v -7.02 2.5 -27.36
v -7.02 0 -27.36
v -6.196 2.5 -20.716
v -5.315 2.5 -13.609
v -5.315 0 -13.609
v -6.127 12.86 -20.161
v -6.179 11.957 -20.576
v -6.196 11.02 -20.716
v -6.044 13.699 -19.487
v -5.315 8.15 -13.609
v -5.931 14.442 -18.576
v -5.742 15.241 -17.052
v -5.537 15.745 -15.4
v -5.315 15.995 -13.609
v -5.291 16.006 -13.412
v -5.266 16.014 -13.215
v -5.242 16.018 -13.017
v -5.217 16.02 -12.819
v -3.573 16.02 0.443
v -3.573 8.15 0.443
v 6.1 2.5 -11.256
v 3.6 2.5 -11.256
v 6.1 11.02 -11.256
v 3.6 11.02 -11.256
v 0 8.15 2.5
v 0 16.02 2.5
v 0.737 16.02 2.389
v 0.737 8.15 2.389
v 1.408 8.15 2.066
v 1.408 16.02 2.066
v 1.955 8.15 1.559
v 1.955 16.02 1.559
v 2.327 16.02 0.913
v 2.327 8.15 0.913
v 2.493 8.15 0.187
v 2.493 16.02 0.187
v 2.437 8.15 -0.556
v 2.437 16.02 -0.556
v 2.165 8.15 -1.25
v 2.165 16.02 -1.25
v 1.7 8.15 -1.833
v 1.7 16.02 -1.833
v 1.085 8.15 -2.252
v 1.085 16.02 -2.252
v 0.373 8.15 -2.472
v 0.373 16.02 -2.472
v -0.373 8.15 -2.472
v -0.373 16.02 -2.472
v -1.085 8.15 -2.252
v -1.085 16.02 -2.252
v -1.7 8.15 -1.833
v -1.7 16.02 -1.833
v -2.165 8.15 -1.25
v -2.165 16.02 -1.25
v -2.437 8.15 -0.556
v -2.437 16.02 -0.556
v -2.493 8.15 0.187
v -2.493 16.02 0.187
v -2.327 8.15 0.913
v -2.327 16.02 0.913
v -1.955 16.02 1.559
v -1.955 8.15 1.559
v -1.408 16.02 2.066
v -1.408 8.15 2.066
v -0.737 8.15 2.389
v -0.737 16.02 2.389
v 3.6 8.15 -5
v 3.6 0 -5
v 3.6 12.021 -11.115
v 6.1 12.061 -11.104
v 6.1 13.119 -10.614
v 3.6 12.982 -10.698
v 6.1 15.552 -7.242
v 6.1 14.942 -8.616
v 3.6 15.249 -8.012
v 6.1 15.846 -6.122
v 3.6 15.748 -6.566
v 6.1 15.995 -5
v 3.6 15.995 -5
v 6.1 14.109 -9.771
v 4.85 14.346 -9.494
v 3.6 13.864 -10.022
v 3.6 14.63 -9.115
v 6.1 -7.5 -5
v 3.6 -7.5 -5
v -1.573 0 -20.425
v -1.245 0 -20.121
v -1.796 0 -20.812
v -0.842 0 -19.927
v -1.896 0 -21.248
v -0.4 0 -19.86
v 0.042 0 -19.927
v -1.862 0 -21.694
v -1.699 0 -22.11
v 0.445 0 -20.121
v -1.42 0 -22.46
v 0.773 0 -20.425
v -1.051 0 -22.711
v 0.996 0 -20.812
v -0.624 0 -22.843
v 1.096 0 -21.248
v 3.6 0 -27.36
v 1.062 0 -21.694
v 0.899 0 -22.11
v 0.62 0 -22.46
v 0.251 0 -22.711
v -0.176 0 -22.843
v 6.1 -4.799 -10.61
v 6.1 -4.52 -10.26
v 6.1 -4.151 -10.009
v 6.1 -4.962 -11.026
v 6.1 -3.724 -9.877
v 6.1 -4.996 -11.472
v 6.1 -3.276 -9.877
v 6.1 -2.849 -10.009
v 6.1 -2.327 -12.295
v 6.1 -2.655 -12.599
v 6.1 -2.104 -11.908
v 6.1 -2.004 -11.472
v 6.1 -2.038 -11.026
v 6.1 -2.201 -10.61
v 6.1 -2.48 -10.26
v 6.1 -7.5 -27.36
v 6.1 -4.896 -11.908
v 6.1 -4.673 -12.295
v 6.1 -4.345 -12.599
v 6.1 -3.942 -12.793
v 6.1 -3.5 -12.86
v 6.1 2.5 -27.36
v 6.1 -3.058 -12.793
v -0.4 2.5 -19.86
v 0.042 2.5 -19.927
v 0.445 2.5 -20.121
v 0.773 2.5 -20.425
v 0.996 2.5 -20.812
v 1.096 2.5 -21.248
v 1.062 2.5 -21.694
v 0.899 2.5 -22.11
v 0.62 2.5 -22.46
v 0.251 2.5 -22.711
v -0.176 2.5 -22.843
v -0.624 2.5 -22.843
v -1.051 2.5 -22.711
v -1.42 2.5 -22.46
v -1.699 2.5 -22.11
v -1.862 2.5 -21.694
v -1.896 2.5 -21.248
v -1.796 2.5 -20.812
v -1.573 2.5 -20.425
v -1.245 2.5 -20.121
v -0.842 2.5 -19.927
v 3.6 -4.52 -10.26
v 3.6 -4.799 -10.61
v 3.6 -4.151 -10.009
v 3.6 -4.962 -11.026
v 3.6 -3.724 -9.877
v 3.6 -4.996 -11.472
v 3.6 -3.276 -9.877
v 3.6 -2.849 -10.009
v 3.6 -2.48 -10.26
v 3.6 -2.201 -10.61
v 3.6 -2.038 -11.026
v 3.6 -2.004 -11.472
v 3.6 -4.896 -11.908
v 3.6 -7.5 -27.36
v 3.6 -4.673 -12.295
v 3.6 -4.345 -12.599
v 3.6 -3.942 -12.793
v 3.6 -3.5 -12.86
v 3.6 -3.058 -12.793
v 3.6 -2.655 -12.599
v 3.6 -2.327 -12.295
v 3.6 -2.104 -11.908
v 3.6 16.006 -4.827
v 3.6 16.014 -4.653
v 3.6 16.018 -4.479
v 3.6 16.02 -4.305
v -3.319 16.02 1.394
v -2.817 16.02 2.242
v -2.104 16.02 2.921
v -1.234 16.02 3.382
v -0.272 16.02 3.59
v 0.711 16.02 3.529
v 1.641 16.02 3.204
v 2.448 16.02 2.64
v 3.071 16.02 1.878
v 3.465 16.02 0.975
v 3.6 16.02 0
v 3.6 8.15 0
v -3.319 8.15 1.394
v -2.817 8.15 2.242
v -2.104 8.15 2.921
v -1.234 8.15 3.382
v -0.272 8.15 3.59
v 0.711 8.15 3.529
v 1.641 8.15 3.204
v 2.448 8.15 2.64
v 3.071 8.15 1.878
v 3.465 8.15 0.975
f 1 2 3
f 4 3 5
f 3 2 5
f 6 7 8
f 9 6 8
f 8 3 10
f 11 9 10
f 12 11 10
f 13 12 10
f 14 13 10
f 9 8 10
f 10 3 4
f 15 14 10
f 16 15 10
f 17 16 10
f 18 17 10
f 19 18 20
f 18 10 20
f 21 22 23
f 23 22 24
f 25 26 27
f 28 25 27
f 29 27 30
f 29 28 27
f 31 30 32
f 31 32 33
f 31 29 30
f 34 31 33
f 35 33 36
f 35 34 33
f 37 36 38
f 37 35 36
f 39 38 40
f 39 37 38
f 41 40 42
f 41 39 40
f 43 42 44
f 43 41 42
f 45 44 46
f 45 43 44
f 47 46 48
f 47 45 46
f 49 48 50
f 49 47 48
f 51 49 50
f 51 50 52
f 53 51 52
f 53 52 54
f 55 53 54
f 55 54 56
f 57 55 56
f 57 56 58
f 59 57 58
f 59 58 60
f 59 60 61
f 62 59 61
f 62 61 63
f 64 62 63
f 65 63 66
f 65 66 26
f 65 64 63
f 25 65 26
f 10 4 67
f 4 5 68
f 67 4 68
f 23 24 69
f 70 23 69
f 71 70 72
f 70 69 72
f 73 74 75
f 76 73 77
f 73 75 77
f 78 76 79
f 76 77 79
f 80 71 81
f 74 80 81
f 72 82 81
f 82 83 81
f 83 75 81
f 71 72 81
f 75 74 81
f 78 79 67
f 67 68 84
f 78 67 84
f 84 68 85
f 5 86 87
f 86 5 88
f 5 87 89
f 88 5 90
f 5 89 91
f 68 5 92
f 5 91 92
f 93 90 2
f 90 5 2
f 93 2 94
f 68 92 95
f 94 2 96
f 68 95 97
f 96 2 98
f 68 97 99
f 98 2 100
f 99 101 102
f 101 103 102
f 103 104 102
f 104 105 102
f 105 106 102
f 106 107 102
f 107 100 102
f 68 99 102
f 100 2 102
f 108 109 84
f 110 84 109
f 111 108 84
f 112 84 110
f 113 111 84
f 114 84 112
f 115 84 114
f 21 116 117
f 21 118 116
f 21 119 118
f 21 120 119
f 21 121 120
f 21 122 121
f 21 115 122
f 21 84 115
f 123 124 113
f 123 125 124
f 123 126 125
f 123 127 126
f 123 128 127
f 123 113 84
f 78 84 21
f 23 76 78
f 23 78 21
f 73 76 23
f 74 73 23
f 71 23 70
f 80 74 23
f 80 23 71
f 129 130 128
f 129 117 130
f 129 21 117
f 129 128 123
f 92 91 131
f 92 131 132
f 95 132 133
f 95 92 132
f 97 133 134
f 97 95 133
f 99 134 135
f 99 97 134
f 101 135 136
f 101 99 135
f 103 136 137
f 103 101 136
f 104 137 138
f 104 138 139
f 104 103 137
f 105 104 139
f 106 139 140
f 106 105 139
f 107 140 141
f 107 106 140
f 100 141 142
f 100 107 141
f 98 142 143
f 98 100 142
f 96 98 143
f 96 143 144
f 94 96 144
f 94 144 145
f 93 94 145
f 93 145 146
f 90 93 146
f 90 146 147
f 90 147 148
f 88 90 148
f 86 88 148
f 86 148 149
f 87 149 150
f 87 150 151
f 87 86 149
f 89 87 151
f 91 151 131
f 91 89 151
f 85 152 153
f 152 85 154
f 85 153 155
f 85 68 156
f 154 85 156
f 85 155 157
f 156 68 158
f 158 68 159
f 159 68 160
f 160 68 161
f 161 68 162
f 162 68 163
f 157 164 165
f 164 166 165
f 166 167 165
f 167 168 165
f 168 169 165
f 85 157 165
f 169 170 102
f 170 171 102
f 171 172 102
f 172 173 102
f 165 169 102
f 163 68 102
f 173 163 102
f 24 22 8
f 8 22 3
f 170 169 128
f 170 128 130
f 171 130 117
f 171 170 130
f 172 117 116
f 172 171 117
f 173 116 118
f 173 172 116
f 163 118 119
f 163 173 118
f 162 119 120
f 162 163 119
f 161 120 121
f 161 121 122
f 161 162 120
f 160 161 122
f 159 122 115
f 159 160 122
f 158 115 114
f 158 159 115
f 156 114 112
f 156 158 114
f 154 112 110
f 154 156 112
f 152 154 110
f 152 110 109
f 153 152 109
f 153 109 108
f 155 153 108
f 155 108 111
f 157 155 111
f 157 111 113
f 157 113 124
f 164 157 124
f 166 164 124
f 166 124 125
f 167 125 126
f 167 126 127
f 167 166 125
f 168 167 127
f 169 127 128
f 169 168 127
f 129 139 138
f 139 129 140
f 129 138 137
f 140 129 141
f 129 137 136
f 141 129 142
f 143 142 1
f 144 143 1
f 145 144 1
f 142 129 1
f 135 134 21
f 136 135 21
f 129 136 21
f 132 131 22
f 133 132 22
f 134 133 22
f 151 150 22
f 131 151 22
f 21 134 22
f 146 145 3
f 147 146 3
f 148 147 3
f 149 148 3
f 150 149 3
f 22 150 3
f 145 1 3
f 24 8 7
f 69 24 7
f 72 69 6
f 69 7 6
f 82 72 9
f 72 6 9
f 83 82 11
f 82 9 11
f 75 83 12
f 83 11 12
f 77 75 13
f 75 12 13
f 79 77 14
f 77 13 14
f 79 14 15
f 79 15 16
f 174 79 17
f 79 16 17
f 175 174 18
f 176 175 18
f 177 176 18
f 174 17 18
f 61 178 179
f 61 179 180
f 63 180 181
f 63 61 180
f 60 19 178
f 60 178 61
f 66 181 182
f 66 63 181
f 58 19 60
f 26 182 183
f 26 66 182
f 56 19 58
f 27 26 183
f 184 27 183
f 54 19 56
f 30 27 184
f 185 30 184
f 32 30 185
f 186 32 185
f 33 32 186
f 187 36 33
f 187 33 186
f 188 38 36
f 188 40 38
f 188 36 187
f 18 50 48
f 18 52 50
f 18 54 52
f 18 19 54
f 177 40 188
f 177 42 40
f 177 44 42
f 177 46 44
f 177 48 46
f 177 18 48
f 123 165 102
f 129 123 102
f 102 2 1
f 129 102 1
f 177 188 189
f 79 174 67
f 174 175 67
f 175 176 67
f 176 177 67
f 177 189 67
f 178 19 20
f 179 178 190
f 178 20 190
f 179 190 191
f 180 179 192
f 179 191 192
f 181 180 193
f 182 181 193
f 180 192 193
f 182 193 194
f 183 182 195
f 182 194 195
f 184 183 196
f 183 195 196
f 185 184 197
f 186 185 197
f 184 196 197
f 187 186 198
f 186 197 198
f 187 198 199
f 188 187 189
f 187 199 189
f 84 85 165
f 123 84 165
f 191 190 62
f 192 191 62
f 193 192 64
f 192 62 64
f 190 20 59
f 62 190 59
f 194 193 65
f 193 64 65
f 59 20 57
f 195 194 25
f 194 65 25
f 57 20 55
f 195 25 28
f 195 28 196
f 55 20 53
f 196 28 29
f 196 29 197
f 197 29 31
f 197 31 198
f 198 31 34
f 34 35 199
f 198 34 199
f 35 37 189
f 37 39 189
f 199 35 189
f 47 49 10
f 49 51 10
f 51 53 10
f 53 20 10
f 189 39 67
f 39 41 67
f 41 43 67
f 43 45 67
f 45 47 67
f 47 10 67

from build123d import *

# Parameters (mm, degrees)
CROQUIS1_R              = 1.5
SALIENTE_EXTRUIR1_DEPTH = 2.5
SALIENTE_EXTRUIR2_START = 8.15
CROQUIS1_3_R            = 2.5
SALIENTE_EXTRUIR2_DEPTH = 7.87
SALIENTE_EXTRUIR5_DEPTH = 16.02
REDONDEO3_R             = 5
CROQUIS8_W              = 22.36
CROQUIS8_H              = 7.5
CROQUIS8_R              = 1.5
SALIENTE_EXTRUIR6_DEPTH = 2.5


with BuildPart() as part:
    # Croquis1 → Saliente-Extruir1 (new body)
    with BuildSketch(Plane(origin=(0, 0, 0), x_dir=(1, 0, 0), z_dir=(0, 1, 0))):
        Polygon((3.6, 27.36), (-7.02, 27.36), (-5.314994069, 13.6091097), (3.6, 5), align=None)
        with Locations(Location((-0.4, 21.36, 0), (0, 0, 270))):
            Circle(CROQUIS1_R, mode=Mode.SUBTRACT)
    extrude(amount=SALIENTE_EXTRUIR1_DEPTH)



with BuildPart() as body_2:
    # Croquis1<3> → Saliente-Extruir2 (new body)
    with BuildSketch(Plane(origin=(0, 0, 0), x_dir=(1, 0, 0), z_dir=(0, 1, 0)).offset(SALIENTE_EXTRUIR2_START)):
        with BuildLine():
            Line((3.6, 5), (-5.314994069, 13.6091097))
            Line((-5.314994069, 13.6091097), (-3.572641648, -0.442980423))
            ThreePointArc((-3.572641648, -0.442980423), (0.221912221, -3.593153902), (3.6, 0))
            Line((3.6, 0), (3.6, 5))
        make_face()
        with Locations(Location((0, 0, 0), (0, 0, 270))):
            Circle(CROQUIS1_3_R, mode=Mode.SUBTRACT)
    extrude(amount=SALIENTE_EXTRUIR2_DEPTH)


with BuildPart() as part_1:
    add(part.part)

    add(body_2.part)  # Saliente-Extruir5 merges body 2
    # Croquis1<6> → Saliente-Extruir5 (add)
    with BuildSketch(Plane(origin=(0, 0, 0), x_dir=(1, 0, 0), z_dir=(0, 1, 0))):
        Polygon((3.6, 11.25573616), (-6.196167881, 20.715785518), (-5.314994069, 13.6091097), (3.6, 5), align=None)
    extrude(amount=SALIENTE_EXTRUIR5_DEPTH)

    # Redondeo3
    redondeo3_edges = [part_1.edges().sort_by_distance(p)[0] for p in [
        (-1.29808394, 16.02, -15.985760839),
    ]]
    fillet(redondeo3_edges, radius=REDONDEO3_R)

    # Croquis8 → Saliente-Extruir6 (add)
    # profile 1 of 2: a face of its own
    with BuildSketch(Plane(origin=(3.6, 0, 0), x_dir=(0, 0, -1), z_dir=(1, 0, 0))):
        with BuildLine():
            Line((5, 15.994937186), (5, 8.15))
            Line((5, 8.15), (5, 0))
            Line((5, 0), (27.36, 0))
            Line((27.36, 0), (27.36, 2.5))
            Line((27.36, 2.5), (11.25573616, 2.5))
            Line((11.25573616, 2.5), (11.25573616, 11.02))
            add(Edge.make_bspline(
                [(11.25573616, 11.02), (11.25573616, 15.542670169), (5, 15.994937186)],
                knots=[3.141592654, 3.141592654, 3.141592654, 4.603302756, 4.603302756, 4.603302756], degree=2, weights=[1, 0.727447175, 0.962144349]))
        make_face()
    # profile 2 of 2: a face of its own
    with BuildSketch(Plane(origin=(3.6, 0, 0), x_dir=(0, 0, -1), z_dir=(1, 0, 0))):
        with Locations((16.18, -3.75)):
            Rectangle(CROQUIS8_W, CROQUIS8_H)
        with Locations((11.36, -3.5)):
            Circle(CROQUIS8_R, mode=Mode.SUBTRACT)
    extrude(amount=SALIENTE_EXTRUIR6_DEPTH)


solid = part_1.part
